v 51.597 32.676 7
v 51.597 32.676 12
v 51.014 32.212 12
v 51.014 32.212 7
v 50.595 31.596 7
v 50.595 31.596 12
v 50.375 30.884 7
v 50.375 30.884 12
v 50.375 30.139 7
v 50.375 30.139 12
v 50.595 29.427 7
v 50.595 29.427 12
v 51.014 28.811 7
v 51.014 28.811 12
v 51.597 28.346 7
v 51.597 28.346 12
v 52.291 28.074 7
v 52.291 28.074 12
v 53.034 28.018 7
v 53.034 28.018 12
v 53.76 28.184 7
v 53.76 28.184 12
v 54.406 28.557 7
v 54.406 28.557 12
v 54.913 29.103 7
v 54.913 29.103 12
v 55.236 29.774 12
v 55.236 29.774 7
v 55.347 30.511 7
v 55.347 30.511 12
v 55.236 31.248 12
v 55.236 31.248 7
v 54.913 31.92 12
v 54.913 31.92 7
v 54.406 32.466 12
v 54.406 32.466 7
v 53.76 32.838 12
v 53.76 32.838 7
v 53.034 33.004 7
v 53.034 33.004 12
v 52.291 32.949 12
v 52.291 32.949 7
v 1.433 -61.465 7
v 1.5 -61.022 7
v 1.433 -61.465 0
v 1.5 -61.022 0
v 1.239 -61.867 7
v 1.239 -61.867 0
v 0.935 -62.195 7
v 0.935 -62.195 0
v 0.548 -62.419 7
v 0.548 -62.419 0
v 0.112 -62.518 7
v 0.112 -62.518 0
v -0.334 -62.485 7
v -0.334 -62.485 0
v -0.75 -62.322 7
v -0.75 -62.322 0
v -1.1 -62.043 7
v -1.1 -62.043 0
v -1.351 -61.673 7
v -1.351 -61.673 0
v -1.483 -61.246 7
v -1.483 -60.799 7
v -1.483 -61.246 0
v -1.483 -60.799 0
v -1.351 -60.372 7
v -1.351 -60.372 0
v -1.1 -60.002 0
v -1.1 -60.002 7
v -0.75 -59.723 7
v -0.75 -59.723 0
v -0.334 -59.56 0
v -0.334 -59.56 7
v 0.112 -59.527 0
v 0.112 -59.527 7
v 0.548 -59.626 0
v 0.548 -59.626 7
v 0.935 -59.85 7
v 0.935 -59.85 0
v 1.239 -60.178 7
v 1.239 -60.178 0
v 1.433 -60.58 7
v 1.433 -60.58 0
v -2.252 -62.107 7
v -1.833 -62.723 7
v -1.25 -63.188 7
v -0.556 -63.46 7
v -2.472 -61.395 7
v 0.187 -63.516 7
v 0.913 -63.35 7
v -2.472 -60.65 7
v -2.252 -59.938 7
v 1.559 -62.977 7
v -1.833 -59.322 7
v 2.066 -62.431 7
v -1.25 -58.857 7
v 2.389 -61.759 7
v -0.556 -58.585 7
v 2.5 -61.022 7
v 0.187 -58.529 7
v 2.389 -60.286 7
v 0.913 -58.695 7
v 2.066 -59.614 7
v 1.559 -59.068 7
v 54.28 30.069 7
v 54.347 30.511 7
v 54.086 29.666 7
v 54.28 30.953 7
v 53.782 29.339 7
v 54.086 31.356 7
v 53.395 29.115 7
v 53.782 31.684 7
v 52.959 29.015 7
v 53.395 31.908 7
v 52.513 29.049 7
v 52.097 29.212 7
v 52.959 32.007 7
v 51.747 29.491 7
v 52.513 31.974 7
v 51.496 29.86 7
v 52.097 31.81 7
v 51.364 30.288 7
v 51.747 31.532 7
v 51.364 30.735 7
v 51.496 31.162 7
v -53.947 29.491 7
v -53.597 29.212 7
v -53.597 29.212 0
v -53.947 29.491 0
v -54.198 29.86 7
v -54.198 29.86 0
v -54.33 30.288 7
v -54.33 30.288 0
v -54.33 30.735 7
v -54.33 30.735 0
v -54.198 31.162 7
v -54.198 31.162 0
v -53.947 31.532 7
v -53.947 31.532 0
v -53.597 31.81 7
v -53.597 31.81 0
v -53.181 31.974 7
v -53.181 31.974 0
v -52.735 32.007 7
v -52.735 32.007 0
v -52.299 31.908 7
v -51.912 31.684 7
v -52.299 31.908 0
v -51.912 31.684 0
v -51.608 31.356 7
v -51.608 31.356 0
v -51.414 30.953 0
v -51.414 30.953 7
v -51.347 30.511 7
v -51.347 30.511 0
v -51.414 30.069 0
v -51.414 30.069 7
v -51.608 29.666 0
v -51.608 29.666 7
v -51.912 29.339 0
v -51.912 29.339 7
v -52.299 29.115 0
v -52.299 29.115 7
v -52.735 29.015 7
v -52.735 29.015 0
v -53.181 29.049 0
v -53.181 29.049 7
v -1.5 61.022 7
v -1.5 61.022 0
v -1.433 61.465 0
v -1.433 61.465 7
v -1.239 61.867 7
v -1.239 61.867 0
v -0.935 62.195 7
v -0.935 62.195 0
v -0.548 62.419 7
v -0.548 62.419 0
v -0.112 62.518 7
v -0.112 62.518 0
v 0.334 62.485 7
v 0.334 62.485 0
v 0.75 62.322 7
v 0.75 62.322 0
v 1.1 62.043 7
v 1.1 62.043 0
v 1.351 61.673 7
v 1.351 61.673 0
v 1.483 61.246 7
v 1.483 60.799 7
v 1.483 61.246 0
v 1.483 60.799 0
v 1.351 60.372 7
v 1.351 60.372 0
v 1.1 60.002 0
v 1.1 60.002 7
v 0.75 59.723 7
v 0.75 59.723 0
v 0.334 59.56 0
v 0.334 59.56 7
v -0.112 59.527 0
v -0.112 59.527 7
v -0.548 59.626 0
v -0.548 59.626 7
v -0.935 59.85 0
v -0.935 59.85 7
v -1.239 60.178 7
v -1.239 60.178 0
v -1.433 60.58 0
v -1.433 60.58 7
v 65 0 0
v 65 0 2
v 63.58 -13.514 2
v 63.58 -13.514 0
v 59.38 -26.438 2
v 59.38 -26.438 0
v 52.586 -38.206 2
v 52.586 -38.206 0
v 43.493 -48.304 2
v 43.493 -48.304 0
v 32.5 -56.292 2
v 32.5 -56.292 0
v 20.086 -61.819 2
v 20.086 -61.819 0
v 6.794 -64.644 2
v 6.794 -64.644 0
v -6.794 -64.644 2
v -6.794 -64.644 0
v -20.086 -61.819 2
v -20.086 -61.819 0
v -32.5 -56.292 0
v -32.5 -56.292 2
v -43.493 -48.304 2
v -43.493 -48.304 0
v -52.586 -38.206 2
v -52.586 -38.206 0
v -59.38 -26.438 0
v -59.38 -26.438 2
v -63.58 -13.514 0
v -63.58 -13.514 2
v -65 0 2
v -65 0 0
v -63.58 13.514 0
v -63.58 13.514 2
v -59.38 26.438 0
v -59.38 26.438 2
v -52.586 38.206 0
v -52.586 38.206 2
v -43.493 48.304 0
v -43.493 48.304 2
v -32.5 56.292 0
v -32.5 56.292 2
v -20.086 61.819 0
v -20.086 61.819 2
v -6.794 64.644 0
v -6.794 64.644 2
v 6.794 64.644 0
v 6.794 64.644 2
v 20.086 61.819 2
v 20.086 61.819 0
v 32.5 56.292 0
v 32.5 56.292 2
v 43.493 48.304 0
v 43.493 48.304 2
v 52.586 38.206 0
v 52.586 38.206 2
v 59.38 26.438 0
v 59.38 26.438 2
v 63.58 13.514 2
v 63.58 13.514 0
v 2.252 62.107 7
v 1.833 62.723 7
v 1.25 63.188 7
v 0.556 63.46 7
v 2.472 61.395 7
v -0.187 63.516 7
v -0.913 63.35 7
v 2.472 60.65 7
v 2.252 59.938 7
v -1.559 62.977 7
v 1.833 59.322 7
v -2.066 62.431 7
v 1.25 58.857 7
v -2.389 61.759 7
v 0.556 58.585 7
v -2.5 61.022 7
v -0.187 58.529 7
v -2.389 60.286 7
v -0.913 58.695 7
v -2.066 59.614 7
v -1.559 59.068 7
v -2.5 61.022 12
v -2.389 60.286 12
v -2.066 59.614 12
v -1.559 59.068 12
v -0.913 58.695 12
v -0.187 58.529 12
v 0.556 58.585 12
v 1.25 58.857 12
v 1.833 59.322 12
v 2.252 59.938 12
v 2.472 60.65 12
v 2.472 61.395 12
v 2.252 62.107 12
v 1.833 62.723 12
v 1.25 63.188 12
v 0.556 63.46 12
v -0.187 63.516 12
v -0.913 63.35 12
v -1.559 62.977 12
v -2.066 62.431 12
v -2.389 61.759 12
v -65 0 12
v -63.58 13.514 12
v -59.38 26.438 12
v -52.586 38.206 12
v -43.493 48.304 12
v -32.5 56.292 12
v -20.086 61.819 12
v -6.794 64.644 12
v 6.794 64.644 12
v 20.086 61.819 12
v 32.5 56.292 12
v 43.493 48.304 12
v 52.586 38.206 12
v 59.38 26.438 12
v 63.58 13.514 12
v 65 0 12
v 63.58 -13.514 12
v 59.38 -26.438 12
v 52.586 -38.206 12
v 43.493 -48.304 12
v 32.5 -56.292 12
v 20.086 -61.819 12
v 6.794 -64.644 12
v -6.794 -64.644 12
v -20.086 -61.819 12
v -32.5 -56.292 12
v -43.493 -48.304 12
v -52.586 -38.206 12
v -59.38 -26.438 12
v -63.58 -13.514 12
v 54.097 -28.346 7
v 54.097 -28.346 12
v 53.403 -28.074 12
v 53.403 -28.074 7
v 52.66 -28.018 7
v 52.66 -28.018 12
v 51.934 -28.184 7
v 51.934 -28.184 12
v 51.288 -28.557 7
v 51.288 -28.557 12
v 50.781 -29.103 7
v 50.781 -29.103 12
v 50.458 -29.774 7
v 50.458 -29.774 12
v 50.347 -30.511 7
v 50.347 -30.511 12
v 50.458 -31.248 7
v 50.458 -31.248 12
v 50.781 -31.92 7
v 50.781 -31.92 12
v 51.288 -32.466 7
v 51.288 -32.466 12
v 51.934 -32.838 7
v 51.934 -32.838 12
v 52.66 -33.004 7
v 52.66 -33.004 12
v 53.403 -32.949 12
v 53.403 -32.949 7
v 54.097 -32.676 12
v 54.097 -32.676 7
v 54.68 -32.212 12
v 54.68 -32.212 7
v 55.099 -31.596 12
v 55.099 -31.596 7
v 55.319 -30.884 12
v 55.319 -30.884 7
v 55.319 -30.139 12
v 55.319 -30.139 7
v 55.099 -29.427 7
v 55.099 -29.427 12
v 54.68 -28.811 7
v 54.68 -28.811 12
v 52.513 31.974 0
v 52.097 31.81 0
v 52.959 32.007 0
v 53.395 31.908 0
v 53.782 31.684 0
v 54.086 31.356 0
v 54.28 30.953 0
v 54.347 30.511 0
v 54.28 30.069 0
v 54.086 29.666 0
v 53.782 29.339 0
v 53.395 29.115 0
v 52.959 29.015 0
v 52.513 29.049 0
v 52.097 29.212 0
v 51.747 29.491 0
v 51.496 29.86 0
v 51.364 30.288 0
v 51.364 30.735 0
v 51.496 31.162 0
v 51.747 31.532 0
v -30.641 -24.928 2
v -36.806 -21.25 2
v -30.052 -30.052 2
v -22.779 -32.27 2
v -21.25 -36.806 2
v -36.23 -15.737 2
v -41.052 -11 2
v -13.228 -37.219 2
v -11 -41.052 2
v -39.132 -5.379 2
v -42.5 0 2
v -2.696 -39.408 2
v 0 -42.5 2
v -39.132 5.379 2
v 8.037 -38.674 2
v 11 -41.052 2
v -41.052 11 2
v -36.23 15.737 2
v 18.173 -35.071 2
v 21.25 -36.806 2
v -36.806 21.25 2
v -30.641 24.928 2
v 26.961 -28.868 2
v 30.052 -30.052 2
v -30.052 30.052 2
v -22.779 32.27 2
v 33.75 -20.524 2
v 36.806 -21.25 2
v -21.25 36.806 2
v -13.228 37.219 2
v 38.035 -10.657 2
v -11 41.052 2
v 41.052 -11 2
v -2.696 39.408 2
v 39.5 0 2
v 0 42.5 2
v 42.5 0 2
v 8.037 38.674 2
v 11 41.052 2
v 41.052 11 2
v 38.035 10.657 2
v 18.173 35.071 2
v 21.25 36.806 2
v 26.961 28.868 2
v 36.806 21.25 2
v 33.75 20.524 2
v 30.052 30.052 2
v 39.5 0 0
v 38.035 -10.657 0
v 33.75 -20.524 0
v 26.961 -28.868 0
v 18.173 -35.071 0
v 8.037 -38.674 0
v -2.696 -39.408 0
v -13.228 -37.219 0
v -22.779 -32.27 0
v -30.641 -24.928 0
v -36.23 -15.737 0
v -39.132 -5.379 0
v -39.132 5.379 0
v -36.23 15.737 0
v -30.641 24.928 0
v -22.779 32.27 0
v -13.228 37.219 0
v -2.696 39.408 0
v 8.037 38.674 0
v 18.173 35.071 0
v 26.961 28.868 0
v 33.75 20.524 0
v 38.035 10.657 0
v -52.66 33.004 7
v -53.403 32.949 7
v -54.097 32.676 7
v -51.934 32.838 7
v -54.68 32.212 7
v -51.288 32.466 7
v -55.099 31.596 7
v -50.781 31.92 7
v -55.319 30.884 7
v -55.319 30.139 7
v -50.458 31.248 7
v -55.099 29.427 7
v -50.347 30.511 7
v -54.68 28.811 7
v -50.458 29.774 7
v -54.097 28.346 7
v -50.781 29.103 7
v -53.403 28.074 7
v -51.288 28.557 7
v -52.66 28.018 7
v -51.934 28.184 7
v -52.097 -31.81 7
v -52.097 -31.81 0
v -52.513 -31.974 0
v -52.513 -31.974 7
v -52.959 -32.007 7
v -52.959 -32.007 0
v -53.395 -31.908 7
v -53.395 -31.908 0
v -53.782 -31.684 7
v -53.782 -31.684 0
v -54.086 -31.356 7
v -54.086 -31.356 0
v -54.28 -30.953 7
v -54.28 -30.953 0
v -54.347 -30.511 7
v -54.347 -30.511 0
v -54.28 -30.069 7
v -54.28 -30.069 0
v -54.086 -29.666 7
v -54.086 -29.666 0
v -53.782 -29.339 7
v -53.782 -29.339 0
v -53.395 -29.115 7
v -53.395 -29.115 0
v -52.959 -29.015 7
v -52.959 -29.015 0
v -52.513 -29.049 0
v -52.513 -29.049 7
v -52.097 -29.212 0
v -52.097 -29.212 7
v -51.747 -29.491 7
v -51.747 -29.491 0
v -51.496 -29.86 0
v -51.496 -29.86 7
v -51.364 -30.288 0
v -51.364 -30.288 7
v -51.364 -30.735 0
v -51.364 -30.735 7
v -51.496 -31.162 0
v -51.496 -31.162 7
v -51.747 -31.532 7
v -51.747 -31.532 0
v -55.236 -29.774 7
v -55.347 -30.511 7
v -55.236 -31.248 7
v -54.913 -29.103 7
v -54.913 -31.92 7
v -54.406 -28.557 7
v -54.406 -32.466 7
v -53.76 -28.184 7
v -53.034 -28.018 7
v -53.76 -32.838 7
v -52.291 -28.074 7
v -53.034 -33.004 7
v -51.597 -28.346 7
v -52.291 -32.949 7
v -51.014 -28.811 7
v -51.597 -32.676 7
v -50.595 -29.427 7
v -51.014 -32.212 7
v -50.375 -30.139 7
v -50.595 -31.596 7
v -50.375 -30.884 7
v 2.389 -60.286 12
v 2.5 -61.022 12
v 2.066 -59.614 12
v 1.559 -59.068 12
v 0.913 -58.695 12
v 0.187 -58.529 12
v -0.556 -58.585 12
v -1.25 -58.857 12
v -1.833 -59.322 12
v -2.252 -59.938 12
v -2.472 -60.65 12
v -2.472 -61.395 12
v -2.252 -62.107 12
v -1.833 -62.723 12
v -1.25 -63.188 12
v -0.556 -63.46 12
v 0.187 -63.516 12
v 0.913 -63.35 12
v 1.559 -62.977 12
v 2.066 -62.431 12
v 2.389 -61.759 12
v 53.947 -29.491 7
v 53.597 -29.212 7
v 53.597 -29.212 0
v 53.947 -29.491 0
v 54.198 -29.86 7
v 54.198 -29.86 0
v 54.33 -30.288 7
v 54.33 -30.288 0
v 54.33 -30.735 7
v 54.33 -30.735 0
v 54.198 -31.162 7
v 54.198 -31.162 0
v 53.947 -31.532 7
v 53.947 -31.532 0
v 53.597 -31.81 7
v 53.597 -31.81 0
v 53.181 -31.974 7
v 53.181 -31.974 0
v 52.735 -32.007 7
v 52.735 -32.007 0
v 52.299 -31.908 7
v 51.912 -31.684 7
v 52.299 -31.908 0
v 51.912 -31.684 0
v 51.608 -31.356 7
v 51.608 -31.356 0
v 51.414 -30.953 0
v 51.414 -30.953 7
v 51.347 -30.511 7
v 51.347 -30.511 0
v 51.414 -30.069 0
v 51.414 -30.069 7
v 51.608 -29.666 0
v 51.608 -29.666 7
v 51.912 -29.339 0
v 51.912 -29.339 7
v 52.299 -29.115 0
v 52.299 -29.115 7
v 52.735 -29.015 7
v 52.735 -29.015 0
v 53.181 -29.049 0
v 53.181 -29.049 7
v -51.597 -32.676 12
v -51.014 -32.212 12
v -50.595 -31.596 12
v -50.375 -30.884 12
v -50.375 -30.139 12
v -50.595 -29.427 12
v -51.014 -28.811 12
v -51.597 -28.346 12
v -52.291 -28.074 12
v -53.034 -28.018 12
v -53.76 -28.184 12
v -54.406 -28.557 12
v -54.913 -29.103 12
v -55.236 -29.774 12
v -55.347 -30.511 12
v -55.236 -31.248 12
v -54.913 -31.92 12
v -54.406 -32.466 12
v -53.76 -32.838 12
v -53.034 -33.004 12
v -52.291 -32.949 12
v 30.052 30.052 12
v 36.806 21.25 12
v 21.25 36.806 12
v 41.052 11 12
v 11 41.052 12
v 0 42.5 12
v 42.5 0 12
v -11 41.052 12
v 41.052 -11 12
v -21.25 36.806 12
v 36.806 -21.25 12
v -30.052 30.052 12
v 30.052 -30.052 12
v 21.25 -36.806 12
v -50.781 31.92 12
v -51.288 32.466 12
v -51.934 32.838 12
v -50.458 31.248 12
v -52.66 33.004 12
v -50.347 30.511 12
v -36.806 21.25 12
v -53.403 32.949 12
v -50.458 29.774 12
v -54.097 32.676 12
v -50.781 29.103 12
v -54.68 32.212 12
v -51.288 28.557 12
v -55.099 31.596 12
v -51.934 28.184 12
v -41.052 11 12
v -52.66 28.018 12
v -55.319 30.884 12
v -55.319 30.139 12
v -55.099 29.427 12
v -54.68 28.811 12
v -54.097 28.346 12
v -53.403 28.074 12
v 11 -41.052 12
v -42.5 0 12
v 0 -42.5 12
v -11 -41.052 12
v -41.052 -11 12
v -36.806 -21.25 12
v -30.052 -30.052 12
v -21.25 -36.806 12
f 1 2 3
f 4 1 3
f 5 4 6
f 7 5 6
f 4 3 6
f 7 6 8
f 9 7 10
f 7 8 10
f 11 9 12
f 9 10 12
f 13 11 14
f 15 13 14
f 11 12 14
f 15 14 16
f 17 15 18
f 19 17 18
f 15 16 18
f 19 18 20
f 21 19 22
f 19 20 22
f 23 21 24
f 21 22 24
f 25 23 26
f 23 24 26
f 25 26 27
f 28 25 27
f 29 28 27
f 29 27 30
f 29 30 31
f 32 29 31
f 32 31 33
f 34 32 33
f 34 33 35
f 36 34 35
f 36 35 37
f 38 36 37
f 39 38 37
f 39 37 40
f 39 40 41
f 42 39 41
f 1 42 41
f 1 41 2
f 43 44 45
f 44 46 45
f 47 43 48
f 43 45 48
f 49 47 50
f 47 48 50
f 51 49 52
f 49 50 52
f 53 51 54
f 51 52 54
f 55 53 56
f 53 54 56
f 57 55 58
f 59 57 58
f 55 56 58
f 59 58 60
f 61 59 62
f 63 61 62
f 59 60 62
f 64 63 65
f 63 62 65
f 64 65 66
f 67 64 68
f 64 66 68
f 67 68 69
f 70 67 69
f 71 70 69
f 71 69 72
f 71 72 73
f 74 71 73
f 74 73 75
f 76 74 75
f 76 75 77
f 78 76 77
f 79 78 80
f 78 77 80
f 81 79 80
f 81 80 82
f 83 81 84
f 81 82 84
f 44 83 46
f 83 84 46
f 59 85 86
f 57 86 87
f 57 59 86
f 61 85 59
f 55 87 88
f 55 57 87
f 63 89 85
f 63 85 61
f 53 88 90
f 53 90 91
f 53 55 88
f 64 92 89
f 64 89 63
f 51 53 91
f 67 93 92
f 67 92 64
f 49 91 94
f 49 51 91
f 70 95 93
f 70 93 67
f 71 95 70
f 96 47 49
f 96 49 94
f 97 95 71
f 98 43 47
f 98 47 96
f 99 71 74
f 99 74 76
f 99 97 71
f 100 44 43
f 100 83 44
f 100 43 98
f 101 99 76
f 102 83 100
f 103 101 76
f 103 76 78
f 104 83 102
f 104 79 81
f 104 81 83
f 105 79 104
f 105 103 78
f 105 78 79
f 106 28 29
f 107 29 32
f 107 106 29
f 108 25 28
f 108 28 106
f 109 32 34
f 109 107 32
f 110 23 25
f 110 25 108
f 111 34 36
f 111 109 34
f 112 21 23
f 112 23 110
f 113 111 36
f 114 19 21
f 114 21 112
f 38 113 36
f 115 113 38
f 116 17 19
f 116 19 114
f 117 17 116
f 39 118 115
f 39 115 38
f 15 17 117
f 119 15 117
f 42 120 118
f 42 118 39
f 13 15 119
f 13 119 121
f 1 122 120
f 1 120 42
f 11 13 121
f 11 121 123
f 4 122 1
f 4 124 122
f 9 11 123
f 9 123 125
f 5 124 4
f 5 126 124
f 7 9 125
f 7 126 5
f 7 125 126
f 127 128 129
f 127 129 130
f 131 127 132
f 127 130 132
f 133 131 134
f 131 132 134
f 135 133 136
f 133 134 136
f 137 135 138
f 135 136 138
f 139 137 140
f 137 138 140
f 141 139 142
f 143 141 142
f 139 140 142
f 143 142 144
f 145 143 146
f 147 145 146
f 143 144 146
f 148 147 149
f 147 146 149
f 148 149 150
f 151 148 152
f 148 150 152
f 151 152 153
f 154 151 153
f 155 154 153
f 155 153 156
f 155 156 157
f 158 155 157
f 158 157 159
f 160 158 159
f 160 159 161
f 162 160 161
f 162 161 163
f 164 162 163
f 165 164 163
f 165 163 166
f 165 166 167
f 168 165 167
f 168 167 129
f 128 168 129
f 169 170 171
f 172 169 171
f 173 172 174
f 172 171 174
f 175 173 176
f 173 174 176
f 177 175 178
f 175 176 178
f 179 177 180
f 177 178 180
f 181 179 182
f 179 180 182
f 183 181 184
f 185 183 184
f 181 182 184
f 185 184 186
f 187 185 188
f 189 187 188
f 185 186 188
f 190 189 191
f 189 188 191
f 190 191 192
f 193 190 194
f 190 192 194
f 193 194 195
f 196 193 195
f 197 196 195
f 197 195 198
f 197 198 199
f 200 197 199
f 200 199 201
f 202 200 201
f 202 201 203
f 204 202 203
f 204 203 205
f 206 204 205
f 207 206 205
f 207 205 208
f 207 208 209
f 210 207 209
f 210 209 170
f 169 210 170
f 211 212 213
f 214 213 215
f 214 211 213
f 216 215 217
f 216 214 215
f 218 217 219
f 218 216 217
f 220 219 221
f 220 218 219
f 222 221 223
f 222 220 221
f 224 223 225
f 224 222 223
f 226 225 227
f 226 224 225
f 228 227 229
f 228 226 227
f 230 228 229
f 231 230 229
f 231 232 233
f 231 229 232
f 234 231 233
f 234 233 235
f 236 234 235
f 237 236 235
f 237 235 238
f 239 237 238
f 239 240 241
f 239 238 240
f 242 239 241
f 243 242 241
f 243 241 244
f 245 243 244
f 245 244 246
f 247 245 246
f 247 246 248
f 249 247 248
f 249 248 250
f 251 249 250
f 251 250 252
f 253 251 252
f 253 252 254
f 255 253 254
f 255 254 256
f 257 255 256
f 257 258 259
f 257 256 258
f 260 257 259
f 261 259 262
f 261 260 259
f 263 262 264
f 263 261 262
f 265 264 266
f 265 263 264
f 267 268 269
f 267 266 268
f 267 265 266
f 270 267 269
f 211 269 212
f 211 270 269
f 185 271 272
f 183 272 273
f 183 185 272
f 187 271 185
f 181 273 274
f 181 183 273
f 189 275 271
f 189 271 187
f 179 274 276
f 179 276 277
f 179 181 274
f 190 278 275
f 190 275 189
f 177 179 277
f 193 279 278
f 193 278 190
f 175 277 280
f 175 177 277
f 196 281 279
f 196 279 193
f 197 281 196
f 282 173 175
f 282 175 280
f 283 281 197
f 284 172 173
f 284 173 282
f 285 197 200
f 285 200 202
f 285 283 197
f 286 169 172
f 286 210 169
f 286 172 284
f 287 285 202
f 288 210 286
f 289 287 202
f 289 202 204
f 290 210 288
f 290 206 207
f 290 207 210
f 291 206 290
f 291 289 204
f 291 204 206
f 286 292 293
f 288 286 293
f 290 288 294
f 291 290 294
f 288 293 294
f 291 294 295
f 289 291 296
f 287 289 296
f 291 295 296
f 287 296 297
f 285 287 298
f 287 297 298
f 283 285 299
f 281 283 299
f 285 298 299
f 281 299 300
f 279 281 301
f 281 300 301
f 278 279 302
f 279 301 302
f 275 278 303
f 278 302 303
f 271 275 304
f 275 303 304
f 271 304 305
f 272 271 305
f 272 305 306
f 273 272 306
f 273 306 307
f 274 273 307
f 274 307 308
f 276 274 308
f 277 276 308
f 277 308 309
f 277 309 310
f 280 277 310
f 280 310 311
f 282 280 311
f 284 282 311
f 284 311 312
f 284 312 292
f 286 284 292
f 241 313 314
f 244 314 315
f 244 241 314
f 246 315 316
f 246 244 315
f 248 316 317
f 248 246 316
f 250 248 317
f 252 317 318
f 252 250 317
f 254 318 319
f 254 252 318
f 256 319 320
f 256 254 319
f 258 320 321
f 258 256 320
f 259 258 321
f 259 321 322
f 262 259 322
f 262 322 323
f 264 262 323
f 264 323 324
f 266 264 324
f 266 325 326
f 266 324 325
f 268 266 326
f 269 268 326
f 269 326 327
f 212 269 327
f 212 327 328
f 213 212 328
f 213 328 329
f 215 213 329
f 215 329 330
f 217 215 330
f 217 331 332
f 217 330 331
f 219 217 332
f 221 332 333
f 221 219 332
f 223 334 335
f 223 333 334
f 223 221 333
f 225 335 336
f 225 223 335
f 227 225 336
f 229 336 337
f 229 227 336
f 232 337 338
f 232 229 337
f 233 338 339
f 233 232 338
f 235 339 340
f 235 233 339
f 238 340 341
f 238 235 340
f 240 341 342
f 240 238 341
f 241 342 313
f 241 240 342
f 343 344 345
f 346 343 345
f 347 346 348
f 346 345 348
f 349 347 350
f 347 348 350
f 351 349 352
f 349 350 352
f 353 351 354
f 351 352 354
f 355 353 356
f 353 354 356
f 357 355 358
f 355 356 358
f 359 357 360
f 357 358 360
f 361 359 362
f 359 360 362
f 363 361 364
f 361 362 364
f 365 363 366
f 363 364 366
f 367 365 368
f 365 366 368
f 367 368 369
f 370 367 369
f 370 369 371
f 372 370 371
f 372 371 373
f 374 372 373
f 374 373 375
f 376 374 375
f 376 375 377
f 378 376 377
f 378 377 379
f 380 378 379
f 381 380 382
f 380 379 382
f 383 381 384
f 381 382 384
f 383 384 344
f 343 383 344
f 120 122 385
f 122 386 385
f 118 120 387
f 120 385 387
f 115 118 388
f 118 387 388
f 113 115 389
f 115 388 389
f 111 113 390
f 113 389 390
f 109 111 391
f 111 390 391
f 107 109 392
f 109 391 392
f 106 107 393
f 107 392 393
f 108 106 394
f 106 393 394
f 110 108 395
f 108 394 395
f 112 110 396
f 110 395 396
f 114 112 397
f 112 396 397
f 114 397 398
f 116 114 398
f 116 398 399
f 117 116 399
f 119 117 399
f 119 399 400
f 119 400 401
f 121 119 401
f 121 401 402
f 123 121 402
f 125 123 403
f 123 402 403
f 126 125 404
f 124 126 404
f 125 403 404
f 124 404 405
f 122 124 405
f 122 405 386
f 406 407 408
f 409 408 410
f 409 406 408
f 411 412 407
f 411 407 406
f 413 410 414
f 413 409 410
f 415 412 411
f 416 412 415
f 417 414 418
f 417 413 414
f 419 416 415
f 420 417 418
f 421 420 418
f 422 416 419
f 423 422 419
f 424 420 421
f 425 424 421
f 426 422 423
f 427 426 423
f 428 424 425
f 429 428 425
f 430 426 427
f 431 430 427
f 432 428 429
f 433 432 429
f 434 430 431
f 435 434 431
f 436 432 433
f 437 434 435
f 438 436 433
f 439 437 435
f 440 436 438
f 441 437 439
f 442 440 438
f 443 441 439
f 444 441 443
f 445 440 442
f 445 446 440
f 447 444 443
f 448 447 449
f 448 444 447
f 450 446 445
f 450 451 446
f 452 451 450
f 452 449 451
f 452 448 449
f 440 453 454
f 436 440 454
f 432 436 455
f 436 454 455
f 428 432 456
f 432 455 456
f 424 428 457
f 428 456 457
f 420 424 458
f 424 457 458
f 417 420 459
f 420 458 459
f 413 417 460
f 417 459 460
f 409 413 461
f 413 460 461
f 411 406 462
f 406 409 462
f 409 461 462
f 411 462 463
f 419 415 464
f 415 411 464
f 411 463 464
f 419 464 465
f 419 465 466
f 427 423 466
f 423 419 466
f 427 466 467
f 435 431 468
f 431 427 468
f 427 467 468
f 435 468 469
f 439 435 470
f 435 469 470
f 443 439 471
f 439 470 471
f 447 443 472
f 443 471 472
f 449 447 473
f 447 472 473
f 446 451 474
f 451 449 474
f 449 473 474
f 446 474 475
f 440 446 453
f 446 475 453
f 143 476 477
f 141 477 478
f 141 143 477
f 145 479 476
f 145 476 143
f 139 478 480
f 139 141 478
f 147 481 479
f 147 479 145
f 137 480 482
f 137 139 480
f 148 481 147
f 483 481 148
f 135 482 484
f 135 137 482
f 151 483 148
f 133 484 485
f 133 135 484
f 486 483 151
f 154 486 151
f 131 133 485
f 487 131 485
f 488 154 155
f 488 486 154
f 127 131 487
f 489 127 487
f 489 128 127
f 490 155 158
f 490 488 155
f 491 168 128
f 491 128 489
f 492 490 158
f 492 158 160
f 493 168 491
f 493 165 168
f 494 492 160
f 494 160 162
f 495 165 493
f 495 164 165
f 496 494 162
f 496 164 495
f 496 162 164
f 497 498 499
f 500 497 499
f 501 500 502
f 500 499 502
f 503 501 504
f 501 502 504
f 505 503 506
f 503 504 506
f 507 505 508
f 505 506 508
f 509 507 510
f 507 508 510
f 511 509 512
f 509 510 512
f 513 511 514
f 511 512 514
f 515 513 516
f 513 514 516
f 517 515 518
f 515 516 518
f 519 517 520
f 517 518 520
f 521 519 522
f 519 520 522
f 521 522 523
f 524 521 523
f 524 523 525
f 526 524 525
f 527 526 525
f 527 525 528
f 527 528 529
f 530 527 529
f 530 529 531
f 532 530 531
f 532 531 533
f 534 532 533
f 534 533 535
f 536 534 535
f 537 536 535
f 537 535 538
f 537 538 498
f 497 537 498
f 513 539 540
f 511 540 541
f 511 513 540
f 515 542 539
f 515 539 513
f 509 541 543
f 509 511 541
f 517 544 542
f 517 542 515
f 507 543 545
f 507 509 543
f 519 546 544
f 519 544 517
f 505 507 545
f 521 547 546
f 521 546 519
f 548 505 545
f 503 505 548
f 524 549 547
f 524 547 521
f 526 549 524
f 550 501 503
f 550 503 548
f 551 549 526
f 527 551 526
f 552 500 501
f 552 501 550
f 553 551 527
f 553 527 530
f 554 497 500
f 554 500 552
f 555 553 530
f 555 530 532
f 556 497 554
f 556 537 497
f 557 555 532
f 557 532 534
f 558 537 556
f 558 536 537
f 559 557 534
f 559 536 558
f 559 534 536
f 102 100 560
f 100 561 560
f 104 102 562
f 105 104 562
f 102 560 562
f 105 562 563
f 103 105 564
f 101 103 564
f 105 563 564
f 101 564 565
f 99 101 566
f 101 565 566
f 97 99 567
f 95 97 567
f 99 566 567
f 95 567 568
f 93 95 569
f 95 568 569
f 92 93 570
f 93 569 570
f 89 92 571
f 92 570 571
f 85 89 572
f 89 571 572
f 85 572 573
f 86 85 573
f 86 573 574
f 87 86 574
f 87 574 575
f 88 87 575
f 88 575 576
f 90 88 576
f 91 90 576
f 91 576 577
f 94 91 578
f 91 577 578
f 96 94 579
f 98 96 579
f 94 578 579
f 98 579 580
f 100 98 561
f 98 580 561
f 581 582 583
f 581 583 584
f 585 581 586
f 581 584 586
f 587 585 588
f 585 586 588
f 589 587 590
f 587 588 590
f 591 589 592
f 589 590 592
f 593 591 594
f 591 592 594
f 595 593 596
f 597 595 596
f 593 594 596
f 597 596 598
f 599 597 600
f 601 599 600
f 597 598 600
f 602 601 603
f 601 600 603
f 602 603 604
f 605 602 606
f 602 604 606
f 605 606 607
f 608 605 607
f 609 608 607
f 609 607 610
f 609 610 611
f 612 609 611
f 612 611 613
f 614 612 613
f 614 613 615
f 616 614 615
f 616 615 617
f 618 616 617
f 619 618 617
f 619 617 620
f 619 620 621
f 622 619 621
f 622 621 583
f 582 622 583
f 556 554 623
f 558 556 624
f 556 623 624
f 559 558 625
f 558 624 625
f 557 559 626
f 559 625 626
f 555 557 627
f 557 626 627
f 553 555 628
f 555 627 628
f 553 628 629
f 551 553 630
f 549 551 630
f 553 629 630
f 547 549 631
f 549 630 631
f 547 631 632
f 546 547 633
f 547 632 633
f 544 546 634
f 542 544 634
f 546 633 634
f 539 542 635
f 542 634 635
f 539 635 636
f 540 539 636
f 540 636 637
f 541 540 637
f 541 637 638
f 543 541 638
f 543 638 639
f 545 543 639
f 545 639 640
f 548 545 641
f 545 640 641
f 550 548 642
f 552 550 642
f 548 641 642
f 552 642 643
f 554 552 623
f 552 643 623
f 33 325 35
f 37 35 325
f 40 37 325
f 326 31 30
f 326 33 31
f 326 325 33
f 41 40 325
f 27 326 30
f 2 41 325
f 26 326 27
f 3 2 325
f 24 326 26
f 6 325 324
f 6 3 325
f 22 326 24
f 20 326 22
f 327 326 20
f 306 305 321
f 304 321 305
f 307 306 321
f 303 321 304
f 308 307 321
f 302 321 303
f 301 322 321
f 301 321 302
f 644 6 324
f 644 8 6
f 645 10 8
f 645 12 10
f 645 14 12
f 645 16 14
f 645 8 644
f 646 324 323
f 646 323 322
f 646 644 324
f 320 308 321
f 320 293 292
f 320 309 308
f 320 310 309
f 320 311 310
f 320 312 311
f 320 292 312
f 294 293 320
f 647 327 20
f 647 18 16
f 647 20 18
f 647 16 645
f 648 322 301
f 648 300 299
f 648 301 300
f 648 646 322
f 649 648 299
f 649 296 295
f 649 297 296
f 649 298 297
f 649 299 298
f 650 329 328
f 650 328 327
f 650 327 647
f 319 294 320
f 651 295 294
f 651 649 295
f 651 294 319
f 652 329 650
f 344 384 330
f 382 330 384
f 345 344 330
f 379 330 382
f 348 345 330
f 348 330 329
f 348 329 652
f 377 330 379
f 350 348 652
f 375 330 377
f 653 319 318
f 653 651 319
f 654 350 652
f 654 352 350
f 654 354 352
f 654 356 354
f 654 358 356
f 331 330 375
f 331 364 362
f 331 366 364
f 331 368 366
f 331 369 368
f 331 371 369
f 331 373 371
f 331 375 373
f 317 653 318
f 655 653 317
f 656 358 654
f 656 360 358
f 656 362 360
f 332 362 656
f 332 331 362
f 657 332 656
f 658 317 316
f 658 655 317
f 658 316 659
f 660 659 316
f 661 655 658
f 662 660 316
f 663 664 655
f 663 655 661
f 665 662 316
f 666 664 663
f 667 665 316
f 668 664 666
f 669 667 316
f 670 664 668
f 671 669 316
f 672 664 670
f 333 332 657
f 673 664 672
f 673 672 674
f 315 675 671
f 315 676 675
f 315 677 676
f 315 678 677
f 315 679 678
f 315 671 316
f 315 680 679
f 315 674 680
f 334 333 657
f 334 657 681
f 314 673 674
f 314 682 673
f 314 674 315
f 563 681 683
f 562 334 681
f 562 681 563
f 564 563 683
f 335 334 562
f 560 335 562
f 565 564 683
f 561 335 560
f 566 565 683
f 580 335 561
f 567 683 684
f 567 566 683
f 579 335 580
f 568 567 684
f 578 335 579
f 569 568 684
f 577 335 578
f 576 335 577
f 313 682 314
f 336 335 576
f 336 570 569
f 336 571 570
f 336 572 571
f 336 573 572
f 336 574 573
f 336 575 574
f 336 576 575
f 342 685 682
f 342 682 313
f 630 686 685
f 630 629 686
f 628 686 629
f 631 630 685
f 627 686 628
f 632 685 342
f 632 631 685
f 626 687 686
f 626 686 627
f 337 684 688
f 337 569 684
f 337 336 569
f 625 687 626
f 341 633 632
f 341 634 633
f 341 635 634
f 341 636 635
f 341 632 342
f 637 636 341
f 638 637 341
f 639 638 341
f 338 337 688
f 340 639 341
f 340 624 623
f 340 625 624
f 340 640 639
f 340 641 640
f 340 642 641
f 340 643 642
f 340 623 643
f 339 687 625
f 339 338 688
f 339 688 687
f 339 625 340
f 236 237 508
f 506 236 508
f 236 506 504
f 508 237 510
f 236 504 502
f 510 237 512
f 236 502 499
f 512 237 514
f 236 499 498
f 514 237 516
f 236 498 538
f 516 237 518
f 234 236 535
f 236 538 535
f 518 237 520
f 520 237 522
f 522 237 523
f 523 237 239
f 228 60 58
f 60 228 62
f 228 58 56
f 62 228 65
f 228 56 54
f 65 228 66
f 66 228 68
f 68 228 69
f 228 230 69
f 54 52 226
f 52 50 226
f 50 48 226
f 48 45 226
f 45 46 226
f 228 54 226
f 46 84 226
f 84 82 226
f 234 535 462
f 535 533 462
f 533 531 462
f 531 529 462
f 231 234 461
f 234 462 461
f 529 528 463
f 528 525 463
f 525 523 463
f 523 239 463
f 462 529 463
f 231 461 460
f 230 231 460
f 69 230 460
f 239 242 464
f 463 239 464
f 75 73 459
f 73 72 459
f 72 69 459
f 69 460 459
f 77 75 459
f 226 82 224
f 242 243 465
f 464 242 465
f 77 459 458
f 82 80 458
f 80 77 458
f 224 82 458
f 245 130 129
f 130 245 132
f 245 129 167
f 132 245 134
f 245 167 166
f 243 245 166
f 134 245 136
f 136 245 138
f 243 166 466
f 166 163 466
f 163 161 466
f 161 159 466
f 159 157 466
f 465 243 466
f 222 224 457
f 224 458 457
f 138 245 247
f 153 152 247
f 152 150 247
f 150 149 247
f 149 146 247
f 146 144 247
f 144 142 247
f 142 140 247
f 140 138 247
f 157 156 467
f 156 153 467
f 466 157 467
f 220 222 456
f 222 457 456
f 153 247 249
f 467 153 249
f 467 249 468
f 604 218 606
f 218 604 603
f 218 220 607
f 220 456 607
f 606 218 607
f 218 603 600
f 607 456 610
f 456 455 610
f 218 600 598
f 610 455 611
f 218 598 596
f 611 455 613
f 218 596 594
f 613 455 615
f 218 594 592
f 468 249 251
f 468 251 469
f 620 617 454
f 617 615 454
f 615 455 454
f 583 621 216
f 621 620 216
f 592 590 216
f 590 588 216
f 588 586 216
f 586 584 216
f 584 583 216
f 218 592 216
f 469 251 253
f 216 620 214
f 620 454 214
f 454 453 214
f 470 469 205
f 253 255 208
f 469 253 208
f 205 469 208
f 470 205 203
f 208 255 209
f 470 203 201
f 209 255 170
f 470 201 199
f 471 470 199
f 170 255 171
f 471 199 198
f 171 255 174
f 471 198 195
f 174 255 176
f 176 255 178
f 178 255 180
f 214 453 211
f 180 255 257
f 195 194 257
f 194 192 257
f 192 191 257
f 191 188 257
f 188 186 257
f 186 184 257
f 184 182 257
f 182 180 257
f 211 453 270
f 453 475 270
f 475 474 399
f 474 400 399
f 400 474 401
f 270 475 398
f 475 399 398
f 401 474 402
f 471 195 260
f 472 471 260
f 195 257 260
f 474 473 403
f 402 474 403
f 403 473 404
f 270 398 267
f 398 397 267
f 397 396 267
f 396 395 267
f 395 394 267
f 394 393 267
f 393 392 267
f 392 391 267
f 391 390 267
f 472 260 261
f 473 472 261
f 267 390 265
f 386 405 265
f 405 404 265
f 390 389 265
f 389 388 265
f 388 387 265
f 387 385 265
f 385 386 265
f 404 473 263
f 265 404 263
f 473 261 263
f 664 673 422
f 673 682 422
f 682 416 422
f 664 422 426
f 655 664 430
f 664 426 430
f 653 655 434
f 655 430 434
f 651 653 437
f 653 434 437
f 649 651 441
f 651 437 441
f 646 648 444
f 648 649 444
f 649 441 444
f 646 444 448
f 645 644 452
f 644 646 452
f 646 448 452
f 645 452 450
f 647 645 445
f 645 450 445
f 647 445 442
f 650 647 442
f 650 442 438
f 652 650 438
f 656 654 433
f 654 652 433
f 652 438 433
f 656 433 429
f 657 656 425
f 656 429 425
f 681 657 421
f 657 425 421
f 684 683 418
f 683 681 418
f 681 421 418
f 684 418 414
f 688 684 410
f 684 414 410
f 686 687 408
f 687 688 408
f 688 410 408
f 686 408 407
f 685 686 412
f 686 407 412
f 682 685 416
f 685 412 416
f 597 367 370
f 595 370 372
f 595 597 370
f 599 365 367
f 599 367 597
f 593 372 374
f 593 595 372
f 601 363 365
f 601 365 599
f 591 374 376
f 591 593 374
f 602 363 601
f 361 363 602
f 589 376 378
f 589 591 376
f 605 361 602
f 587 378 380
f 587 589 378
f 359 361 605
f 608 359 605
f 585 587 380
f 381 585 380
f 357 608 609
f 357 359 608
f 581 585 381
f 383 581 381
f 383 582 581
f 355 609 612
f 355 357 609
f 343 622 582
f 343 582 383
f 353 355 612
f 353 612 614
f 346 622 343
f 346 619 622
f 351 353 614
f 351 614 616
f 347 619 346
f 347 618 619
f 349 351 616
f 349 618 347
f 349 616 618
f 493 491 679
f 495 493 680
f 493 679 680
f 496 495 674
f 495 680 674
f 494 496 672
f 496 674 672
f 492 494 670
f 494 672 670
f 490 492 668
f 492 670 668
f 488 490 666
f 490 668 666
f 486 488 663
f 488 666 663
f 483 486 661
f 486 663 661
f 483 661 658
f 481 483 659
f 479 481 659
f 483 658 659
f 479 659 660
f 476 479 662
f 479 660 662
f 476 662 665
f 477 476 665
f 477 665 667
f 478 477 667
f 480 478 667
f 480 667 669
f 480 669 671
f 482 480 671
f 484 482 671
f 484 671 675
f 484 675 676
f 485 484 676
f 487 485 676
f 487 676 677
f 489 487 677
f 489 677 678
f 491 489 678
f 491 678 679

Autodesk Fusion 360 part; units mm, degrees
sketch "Sketch1" plane through (0, 0, 0) normal (0, 0, 1) x (1, 0, 0)
  circle A0 centre (0, 0) radius 65
  circle A1 centre (0, 0) radius 61.0225 construction
  circle A2 centre (0, 0) radius 39.5
  circle A3 centre (0, -61.0225) radius 1.5
  dimension "d1" = 130
  dimension "d2" = 122.045
  dimension "d3" = 79
  dimension "ScrewDia" = 3
extrude "Extrude1" add sketch "Sketch1" along normal blind 2 contours A0 | A3
sketch "Sketch2" plane through (0, 0, 2) normal (0, 0, 1) x (-1, 0, 0)
  circle A0 centre (0, 0) radius 39.5
  circle A1 centre (0, 0) radius 65
  circle A2 centre (0, 0) radius 42.5
  dimension "BearingDia" = 85
extrude "Extrude2" add sketch "Sketch2" along normal blind 10 contours A1
extrude "Extrude3" cut sketch "Sketch1" along normal blind 25 contours A3
sketch "Sketch3" plane through (0, 0, 12) normal (0, 0, 1) x (-1, 0, 0)
  circle A0 centre (0, 61.0225) radius 1.5
  circle A1 centre (0, 0) radius 42.5
  circle A2 centre (0, 0) radius 65
  circle A3 centre (0, -61.0225) radius 2.5
  dimension "ScrewHeadDia" = 5
extrude "Extrude4" cut sketch "Sketch3" against normal blind 5 contours A3
pattern_circular "C-Pattern1" count 6 over 360 about axis through (0, 0, 1.75) along (0, 0, 1) of "Extrude3", "Extrude4"
equation "BearingHieght = 10 mm"
equation "ScrewHeadDepth = -5 mm"
